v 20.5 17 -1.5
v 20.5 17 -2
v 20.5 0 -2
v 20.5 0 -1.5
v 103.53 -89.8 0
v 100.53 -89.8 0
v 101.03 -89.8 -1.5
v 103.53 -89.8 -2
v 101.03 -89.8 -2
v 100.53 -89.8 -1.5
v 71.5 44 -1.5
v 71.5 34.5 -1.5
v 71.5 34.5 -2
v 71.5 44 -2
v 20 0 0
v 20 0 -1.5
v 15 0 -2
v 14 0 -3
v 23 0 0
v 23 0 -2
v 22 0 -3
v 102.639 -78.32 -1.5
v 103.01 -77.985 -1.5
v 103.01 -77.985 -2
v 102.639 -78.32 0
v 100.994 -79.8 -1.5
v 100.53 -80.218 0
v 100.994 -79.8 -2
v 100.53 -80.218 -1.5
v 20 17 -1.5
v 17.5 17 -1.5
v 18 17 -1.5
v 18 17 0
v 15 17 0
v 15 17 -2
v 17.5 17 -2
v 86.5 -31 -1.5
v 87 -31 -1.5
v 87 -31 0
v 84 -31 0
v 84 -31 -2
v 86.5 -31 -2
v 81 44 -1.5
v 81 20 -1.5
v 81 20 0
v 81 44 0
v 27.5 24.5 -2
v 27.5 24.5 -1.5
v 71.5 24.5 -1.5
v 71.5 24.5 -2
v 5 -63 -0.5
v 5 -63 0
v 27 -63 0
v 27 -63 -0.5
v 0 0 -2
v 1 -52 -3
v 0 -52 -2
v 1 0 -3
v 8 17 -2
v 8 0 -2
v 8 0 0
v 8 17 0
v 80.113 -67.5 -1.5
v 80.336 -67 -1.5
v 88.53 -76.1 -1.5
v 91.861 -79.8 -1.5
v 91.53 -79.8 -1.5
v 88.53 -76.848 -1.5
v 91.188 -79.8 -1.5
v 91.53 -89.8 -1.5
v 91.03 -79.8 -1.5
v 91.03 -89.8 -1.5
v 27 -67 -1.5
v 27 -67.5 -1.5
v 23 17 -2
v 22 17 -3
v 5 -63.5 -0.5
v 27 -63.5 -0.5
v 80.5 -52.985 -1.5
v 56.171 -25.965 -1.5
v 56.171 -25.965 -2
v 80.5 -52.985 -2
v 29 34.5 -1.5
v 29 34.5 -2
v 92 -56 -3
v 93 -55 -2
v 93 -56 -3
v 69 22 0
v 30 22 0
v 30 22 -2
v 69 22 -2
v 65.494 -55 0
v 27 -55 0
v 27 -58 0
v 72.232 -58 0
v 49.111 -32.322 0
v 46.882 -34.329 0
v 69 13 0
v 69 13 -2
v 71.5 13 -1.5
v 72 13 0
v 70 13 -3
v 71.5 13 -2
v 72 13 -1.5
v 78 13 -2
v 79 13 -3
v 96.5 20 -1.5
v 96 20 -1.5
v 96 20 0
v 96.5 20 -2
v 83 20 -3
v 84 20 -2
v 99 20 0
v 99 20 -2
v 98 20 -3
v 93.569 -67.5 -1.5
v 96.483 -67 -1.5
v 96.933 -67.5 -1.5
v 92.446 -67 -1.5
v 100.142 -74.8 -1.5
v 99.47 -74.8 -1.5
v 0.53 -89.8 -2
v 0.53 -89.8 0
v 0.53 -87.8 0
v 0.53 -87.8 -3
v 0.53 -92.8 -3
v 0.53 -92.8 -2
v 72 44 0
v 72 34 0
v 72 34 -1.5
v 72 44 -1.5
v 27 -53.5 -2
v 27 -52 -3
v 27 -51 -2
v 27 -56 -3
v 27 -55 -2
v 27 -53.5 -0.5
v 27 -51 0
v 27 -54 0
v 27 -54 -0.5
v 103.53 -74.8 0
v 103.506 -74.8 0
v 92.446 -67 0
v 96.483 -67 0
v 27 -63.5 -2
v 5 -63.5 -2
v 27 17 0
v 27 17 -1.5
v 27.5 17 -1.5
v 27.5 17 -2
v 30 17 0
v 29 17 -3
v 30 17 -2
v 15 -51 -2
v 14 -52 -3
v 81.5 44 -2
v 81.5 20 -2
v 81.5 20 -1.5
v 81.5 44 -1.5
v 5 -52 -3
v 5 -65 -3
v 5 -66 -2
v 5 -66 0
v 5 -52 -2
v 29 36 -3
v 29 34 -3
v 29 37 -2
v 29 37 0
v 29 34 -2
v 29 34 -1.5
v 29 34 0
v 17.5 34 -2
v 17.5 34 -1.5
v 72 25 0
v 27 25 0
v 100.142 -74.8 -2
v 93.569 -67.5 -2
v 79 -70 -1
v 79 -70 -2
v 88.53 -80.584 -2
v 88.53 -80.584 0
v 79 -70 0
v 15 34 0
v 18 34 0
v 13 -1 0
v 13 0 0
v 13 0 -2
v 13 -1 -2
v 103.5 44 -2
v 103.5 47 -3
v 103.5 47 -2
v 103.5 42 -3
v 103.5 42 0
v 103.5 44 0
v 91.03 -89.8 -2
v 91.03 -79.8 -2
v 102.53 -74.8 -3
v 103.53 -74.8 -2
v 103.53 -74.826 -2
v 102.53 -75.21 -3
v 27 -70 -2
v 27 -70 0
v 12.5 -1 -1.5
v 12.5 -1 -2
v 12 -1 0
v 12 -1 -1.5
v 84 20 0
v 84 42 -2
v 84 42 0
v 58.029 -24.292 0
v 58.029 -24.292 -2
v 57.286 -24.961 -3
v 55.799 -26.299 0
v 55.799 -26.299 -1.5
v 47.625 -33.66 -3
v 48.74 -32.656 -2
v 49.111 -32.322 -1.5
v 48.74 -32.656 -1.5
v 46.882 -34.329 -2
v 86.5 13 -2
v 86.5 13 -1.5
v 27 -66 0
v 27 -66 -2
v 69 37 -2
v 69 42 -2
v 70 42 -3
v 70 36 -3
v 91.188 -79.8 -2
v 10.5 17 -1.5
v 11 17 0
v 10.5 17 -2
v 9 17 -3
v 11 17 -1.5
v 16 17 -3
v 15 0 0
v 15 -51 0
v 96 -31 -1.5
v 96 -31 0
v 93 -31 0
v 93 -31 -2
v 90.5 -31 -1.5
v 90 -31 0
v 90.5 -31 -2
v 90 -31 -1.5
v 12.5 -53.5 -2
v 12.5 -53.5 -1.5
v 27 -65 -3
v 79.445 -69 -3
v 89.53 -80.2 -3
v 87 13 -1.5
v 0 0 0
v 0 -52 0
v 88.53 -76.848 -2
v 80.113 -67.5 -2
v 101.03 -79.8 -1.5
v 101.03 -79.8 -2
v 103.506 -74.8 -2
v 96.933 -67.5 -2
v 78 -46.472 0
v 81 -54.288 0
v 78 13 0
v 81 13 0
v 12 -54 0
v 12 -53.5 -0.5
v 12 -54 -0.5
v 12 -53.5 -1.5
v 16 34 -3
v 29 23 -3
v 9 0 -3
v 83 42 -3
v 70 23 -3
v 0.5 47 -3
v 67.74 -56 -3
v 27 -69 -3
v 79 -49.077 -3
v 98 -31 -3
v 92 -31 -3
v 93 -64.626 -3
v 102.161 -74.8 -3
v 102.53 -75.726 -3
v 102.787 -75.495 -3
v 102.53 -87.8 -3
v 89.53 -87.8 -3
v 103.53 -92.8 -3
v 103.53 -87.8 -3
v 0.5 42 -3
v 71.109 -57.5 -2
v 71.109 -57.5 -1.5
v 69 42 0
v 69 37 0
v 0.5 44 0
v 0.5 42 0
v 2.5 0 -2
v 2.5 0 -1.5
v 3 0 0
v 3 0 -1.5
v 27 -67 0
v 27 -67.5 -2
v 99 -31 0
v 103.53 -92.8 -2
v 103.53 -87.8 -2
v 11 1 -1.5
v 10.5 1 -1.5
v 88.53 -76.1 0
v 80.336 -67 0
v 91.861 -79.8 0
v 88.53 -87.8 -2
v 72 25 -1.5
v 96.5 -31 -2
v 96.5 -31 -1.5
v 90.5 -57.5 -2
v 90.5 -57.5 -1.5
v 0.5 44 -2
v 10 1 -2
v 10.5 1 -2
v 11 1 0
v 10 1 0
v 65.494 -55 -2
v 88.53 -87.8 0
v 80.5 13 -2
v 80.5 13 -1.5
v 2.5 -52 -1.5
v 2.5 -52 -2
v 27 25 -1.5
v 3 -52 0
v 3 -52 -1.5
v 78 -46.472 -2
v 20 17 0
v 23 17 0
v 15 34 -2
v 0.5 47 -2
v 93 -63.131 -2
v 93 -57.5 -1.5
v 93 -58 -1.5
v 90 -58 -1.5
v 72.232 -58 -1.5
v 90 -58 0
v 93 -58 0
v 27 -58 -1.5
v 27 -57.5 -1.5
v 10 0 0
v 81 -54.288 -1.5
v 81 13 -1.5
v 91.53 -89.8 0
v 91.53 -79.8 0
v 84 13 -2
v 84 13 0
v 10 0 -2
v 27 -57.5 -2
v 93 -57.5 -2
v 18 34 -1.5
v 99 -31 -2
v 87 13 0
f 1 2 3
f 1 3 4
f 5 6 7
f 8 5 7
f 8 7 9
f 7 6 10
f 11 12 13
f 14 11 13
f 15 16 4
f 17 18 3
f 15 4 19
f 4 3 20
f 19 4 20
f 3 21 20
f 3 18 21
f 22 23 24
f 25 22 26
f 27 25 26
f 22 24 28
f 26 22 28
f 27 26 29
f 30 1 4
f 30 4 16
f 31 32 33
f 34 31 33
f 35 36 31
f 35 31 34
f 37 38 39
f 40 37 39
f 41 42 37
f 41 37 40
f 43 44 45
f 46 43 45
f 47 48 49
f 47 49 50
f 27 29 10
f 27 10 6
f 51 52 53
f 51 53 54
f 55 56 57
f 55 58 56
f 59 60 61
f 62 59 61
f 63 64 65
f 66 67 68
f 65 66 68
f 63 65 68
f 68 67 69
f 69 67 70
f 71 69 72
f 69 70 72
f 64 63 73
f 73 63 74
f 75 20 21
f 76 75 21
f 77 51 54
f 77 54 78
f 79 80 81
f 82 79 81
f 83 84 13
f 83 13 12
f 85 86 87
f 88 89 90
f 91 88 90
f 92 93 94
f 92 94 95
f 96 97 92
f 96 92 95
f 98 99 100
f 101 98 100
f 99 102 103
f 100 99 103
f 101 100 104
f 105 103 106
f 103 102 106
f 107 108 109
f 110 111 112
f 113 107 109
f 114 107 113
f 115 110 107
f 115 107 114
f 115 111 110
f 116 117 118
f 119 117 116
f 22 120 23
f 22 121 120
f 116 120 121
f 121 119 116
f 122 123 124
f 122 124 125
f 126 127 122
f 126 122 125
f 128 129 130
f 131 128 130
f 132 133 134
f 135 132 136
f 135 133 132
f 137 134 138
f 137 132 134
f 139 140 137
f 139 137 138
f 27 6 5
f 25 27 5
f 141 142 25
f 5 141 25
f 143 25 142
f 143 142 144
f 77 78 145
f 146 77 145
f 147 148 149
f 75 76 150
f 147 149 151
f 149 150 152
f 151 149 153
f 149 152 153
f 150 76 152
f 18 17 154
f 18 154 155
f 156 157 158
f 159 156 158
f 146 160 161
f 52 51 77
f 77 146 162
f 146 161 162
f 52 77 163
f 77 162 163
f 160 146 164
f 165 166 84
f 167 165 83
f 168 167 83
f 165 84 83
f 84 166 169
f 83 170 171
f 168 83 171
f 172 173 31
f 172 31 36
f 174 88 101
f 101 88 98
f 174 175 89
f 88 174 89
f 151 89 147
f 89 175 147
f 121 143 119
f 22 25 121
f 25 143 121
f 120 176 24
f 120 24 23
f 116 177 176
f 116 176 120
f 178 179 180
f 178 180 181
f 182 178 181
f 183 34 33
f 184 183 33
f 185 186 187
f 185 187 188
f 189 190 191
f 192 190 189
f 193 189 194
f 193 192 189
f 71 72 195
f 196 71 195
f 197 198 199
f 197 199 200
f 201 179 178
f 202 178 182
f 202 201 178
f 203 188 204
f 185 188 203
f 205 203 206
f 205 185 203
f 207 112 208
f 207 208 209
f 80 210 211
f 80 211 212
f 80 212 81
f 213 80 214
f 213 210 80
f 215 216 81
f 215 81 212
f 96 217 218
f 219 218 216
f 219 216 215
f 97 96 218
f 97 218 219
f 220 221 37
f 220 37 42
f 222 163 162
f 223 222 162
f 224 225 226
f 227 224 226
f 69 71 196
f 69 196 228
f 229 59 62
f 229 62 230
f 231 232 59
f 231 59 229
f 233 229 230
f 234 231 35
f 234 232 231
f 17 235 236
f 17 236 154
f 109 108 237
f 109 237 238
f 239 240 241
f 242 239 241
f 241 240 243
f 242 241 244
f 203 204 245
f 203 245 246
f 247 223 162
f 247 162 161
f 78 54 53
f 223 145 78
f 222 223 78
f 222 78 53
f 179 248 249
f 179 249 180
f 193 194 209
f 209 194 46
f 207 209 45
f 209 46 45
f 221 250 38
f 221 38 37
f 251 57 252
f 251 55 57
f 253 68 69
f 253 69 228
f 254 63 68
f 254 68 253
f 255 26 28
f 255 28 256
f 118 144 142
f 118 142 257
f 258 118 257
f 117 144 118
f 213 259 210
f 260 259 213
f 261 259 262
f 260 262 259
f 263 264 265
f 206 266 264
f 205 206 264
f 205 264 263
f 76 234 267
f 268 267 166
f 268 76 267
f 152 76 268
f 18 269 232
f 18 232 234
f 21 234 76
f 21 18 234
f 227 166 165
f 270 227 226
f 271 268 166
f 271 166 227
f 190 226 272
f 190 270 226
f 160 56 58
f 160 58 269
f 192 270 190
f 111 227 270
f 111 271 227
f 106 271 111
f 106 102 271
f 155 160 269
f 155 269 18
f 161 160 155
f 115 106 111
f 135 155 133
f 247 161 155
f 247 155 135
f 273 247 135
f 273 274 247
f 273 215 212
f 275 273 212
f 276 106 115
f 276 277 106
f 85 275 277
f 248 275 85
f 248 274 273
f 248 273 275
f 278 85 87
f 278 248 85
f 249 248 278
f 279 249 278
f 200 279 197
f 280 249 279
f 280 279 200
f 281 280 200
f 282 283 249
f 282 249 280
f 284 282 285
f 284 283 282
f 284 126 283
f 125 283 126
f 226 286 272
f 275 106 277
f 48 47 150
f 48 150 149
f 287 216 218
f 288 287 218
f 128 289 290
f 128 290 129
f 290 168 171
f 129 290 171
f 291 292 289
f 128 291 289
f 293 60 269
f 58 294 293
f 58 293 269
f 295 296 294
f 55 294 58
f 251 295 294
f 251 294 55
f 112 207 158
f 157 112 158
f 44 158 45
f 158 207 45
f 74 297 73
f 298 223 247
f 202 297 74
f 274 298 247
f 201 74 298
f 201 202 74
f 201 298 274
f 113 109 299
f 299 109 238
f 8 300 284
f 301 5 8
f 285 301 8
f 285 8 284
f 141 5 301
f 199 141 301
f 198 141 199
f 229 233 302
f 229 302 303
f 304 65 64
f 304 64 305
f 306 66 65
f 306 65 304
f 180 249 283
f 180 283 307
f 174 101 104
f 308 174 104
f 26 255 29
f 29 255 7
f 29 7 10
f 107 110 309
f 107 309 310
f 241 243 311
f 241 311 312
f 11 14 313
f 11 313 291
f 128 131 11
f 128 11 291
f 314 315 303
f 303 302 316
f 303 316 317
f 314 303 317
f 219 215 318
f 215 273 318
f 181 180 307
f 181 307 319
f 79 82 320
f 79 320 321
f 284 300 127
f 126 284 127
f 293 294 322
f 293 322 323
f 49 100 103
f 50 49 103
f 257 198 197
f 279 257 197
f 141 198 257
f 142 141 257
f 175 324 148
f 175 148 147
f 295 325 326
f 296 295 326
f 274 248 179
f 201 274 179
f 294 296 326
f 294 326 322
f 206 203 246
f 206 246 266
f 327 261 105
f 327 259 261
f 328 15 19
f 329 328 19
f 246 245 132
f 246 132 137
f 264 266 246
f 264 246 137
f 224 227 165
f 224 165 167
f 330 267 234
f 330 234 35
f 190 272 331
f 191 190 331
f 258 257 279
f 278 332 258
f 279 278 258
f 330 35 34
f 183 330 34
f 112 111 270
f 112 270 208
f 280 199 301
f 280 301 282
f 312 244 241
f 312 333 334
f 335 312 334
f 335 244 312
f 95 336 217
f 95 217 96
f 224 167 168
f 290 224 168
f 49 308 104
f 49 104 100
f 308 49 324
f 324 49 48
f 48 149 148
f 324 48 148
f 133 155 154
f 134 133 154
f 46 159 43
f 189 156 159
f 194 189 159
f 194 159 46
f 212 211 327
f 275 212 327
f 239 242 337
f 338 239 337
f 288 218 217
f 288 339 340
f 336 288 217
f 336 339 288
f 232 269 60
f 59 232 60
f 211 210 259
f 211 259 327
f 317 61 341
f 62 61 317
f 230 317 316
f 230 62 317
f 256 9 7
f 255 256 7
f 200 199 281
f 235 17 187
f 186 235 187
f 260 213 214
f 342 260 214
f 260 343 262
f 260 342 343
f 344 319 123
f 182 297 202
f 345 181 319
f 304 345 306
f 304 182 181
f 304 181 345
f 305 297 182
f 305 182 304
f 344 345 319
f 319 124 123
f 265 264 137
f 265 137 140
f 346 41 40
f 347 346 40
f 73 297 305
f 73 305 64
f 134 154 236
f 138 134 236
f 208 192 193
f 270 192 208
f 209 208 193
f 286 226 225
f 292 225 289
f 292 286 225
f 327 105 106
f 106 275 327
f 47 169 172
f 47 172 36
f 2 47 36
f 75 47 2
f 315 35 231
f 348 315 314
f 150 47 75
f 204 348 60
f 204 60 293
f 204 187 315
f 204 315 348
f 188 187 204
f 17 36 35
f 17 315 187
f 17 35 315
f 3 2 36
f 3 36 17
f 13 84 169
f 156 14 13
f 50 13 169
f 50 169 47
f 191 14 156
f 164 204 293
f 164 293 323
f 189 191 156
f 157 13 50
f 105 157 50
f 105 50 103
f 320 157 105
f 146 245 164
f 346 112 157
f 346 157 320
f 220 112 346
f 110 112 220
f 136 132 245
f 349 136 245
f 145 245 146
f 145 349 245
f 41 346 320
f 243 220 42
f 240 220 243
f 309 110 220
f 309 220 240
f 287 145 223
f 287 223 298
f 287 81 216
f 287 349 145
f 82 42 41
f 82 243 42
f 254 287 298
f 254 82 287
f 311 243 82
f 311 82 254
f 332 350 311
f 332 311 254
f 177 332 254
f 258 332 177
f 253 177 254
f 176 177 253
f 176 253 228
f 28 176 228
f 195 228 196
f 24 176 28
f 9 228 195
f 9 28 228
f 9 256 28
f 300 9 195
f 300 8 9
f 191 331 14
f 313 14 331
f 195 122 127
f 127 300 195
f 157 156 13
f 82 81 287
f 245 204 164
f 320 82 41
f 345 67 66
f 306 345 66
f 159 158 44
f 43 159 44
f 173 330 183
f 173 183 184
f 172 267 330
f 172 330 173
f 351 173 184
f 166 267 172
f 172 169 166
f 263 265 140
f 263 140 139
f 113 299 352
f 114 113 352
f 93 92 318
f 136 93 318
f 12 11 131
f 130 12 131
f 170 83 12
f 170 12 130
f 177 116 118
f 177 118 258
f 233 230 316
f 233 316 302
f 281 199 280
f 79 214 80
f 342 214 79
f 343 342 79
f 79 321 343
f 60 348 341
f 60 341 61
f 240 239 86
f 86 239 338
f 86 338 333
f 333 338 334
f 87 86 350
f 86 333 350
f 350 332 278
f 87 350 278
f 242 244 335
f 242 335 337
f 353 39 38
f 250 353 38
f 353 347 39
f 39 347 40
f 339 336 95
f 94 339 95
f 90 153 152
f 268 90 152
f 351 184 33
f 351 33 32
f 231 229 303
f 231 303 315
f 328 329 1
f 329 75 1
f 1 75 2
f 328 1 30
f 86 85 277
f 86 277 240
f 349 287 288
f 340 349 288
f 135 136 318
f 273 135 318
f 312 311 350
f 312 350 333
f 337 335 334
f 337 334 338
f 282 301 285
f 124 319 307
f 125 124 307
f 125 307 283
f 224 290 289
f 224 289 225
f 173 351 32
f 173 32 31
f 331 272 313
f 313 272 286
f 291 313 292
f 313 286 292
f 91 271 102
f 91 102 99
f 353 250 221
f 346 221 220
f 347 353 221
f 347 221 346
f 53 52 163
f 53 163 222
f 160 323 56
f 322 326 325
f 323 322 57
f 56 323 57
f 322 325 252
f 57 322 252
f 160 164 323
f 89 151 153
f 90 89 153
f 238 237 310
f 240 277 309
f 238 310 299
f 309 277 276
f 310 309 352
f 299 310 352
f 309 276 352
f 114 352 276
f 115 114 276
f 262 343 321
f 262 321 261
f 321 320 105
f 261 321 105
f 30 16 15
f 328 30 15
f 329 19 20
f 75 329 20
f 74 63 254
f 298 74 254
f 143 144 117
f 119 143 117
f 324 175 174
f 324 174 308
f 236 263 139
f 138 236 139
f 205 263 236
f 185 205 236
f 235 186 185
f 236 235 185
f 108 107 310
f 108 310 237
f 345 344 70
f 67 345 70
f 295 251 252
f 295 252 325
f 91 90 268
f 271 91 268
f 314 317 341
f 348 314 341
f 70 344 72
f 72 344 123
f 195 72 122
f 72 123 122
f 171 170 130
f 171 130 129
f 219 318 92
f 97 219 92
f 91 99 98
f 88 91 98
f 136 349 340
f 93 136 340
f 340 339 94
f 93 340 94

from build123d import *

# Parameters (mm, degrees)
PAD_DEPTH       = 51
PAD001_DEPTH    = 22
PAD002_DEPTH    = 66
PAD003_DEPTH    = 1
PAD004_DEPTH    = 25
PAD005_DEPTH    = 51
PAD006_DEPTH    = 17
PAD007_DEPTH    = 17
PAD008_DEPTH    = 17
PAD009_DEPTH    = 41
SKETCH010_W     = 2
SKETCH010_H     = 1
PAD010_DEPTH    = 7
POCKET_DEPTH    = 1
PAD011_DEPTH    = 68
POCKET001_DEPTH = 68
POCKET002_DEPTH = 70
POCKET003_DEPTH = 22
POCKET004_DEPTH = 54
POCKET005_DEPTH = 17
SKETCH018_W     = 3
SKETCH018_H     = 2
POCKET006_DEPTH = 2
POCKET007_DEPTH = 17
PAD012_DEPTH    = 17
PAD013_DEPTH    = 18
POCKET008_DEPTH = 70
SKETCH023_W     = 3
SKETCH023_H     = 5
PAD014_DEPTH    = 103
POCKET009_DEPTH = 13
SKETCH025_W     = 2
SKETCH025_H     = 3
POCKET010_DEPTH = 103
SKETCH026_W     = 3
SKETCH026_H     = 5
PAD015_DEPTH    = 103
SKETCH027_W     = 2
SKETCH027_H     = 3
POCKET011_DEPTH = 103
POCKET012_DEPTH = 31
POCKET013_DEPTH = 45
POCKET014_DEPTH = 28
PAD016_DEPTH    = 44
POCKET015_DEPTH = 51
SKETCH033_W     = 6
SKETCH033_H     = 7
POCKET016_DEPTH = 2


with BuildPart() as part:
    # Sketch → Pad (new body)
    with BuildSketch(Plane.XZ):
        Polygon((0, 0), (15, 0), (15, -2), (14, -3), (1, -3), (0, -2), align=None)
    extrude(amount=PAD_DEPTH)

    # Sketch001 (on Face2 of Pad) → Pad001 (join)
    with BuildSketch(Plane(origin=(5, 0, 0), x_dir=(0, 0, 1), z_dir=(1, 0, 0))):
        Polygon((0, 51), (0, 66), (-2, 66), (-3, 65), (-3, 52), (-2, 51), align=None)
    extrude(amount=PAD001_DEPTH)

    # Sketch002 (on Face14 of Pad001) → Pad002 (join)
    with BuildSketch(Plane(origin=(27, 0, 0), x_dir=(0, 0, 1), z_dir=(1, 0, 0))):
        Polygon((0, 70), (0, 55), (-2, 55), (-3, 56), (-3, 69), (-2, 70), align=None)
    extrude(amount=PAD002_DEPTH)

    # Sketch004 (on Face5 of Pad002) → Pad003 (join)
    with BuildSketch(Plane.XZ.offset(51)):
        Polygon((0, 0), (15, 0), (15, -2), (14, -3), (1, -3), (0, -2), align=None)
    extrude(amount=PAD003_DEPTH)

    # Sketch003 (on Face20 of Pad002) → Pad004 (join)
    with BuildSketch(Plane(origin=(0, -56, 0), x_dir=(1, 0, 0), z_dir=(0, 1, 0))):
        Polygon((93, 0), (78, 0), (78, 2), (79, 3), (92, 3), (93, 2), align=None)
    extrude(amount=PAD004_DEPTH)

    # Sketch005 (on Face38 of Pad004) → Pad005 (join)
    with BuildSketch(Plane(origin=(0, -31, 0), x_dir=(1, 0, 0), z_dir=(0, 1, 0))):
        Polygon((84, 0), (99, 0), (99, 2), (98, 3), (85, 3), (84, 2), align=None)
    extrude(amount=PAD005_DEPTH)

    # Sketch006 (on Face47 of Pad005) → Pad006 (join)
    with BuildSketch(Plane(origin=(0, 13, 0), x_dir=(1, 0, 0), z_dir=(0, 1, 0))):
        Polygon((69, 0), (84, 0), (84, 2), (83, 3), (70, 3), (69, 2), align=None)
    extrude(amount=PAD006_DEPTH)

    # Sketch007 (on Face4 of Pad006) → Pad007 (join)
    with BuildSketch(Plane(origin=(0, 0, 0), x_dir=(1, 0, 0), z_dir=(0, 1, 0))):
        Polygon((8, 0), (23, 0), (23, 2), (22, 3), (9, 3), (8, 2), align=None)
    extrude(amount=PAD007_DEPTH)

    # Sketch008 (on Face17 of Pad007) → Pad008 (join)
    with BuildSketch(Plane(origin=(0, 17, 0), x_dir=(1, 0, 0), z_dir=(0, 1, 0))):
        Polygon((15, 0), (30, 0), (30, 2), (29, 3), (16, 3), (15, 2), align=None)
    extrude(amount=PAD008_DEPTH)

    # Sketch009 (on Face31 of Pad008) → Pad009 (join)
    with BuildSketch(Plane(origin=(29, 0, 0), x_dir=(0, 0, 1), z_dir=(1, 0, 0))):
        Polygon((0, -37), (0, -22), (-2, -22), (-3, -23), (-3, -36), (-2, -37), align=None)
    extrude(amount=PAD009_DEPTH)

    # Sketch010 (on Face81 of Pad009) → Pad010 (join)
    with BuildSketch(Plane(origin=(0, 13, 0), x_dir=(1, 0, 0), z_dir=(0, 1, 0))):
        with Locations((84, 2.5)):
            Rectangle(SKETCH010_W, SKETCH010_H)
    extrude(amount=PAD010_DEPTH)

    # Sketch011 (on Face36 of Pad010) → Pocket (cut)
    with BuildSketch(Plane(origin=(0, 0, 0), x_dir=(-1, 0, 0), z_dir=(0, 0, 1))):
        Polygon((-90.1471723822, 70), (-79, 70), (-90.1471723822, 59.9630409046), align=None)
    extrude(amount=-POCKET_DEPTH, mode=Mode.SUBTRACT)

    # Sketch012 (on Face51 of Pocket) → Pad011 (join)
    with BuildSketch(Plane(origin=(38.0611229336, -42.2711594585, 0), x_dir=(0.7431448255, 0.6691306064, 0), z_dir=(0.6691306064, -0.7431448255, 0))):
        Polygon((11.8692987676, 0), (26.8692987676, 0), (26.8692987676, -2), (25.8692987676, -3), (12.8692987676, -3), (11.8692987676, -2), align=None)
    extrude(amount=PAD011_DEPTH)

    # Sketch013 (on Face80 of Pad011) → Pocket001 (cut)
    with BuildSketch(Plane(origin=(83.562004166, -92.805007591, 0), x_dir=(0.7431448255, 0.6691306064, 0), z_dir=(0.6691306064, -0.7431448255, 0))):
        Polygon((14.8692987676, 0), (23.8692987676, 0), (23.8692987676, -1.5), (24.3692987676, -1.5), (24.3692987676, -2), (14.3692987676, -2), (14.3692987676, -1.5), (14.8692987676, -1.5), align=None)
    extrude(amount=-POCKET001_DEPTH, mode=Mode.SUBTRACT)

    # Sketch014 (on Face46 of Pocket001) → Pocket002 (cut)
    with BuildSketch(Plane(origin=(27, 0, 0), x_dir=(0, 0, -1), z_dir=(-1, 0, 0))):
        Polygon((0, 67), (1.5, 67), (1.5, 67.5), (2, 67.5), (2, 57.5), (1.5, 57.5), (1.5, 58), (0, 58), align=None)
    extrude(amount=-POCKET002_DEPTH, mode=Mode.SUBTRACT)

    # Sketch015 (on Face34 of Pocket002) → Pocket003 (cut)
    with BuildSketch(Plane(origin=(5, 0, 0), x_dir=(0, 0, -1), z_dir=(-1, 0, 0))):
        Polygon((0, 63), (0.5, 63), (0.5, 63.5), (2, 63.5), (2, 53.5), (0.5, 53.5), (0.5, 54), (0, 54), align=None)
    extrude(amount=-POCKET003_DEPTH, mode=Mode.SUBTRACT)

    # Sketch016 (on Face4 of Pocket003) → Pocket004 (cut)
    with BuildSketch(Plane(origin=(0, 0, 0), x_dir=(1, 0, 0), z_dir=(0, 1, 0))):
        Polygon((2.5, 2), (12.5, 2), (12.5, 1.5), (12, 1.5), (12, 0), (3, 0), (3, 1.5), (2.5, 1.5), align=None)
    extrude(amount=-POCKET004_DEPTH, mode=Mode.SUBTRACT)

    # Sketch017 (on Face19 of Pocket004) → Pocket005 (cut)
    with BuildSketch(Plane(origin=(0, 17, 0), x_dir=(1, 0, 0), z_dir=(0, 1, 0))):
        Polygon((11, 0), (11, 1.5), (10.5, 1.5), (10.5, 2), (20.5, 2), (20.5, 1.5), (20, 1.5), (20, 0), align=None)
    extrude(amount=-POCKET005_DEPTH, mode=Mode.SUBTRACT)

    # Sketch018 (on Face48 of Pocket005) → Pocket006 (cut)
    with BuildSketch(Plane(origin=(0, 0, 0), x_dir=(-1, 0, 0), z_dir=(0, 0, 1))):
        with Locations((-11.5, 0)):
            Rectangle(SKETCH018_W, SKETCH018_H)
    extrude(amount=-POCKET006_DEPTH, mode=Mode.SUBTRACT)

    # Sketch019 (on Face63 of Pocket006) → Pocket007 (cut)
    with BuildSketch(Plane(origin=(0, 34, 0), x_dir=(1, 0, 0), z_dir=(0, 1, 0))):
        Polygon((18, 0), (18, 1.5), (17.5, 1.5), (17.5, 2), (27.5, 2), (27.5, 1.5), (27, 1.5), (27, 0), align=None)
    extrude(amount=-POCKET007_DEPTH, mode=Mode.SUBTRACT)

    # Sketch020 (on Face117 of Pocket007) → Pad012 (join)
    with BuildSketch(Plane(origin=(0, 30, 0), x_dir=(1, 0, 0), z_dir=(0, 1, 0))):
        Polygon((70, 3), (83, 3), (84, 2), (84, 0), (69, 0), (69, 2), align=None)
    extrude(amount=PAD012_DEPTH)

    # Sketch021 (on Face108 of Pad012) → Pad013 (join)
    with BuildSketch(Plane.XZ.offset(74.8)):
        Polygon((88.5297845093, 0), (103.5297845093, 0), (103.5297845093, -2), (102.5297845093, -3), (89.5297845093, -3), (88.5297845093, -2), align=None)
    extrude(amount=PAD013_DEPTH)

    # Sketch022 (on Face158 of Pad013) → Pocket008 (cut)
    with BuildSketch(Plane(origin=(38.0611229336, -42.2711594585, 0), x_dir=(0.7431448255, 0.6691306064, 0), z_dir=(-0.6691306064, 0.7431448255, 0))):
        Polygon((14.3692987676, 2), (24.3692987676, 2), (24.3692987676, 1.5), (23.8692987676, 1.5), (23.8692987676, 0), (14.8692987676, 0), (14.8692987676, 1.5), (14.3692987676, 1.5), align=None)
    extrude(amount=-POCKET008_DEPTH, mode=Mode.SUBTRACT)

    # Sketch023 (on Face171 of Pocket008) → Pad014 (join)
    with BuildSketch(Plane(origin=(103.5297845093, 0, 0), x_dir=(0, 0, -1), z_dir=(-1, 0, 0))):
        with Locations((1.5, 90.3)):
            Rectangle(SKETCH023_W, SKETCH023_H)
    extrude(amount=PAD014_DEPTH)

    # Sketch024 (on Face231 of Pad014) → Pocket009 (cut)
    with BuildSketch(Plane.XZ.offset(92.8)):
        Polygon((91.0297845093, -2), (101.0297845093, -2), (101.0297845093, -1.5), (100.5297845093, -1.5), (100.5297845093, 0), (91.5297845093, 0), (91.5297845093, -1.5), (91.0297845093, -1.5), align=None)
    extrude(amount=-POCKET009_DEPTH, mode=Mode.SUBTRACT)

    # Sketch025 (on Face210 of Pocket009) → Pocket010 (cut)
    with BuildSketch(Plane(origin=(0.5297845093, 0, 0), x_dir=(0, 0, -1), z_dir=(-1, 0, 0))):
        with Locations((1, 91.3)):
            Rectangle(SKETCH025_W, SKETCH025_H)
    extrude(amount=-POCKET010_DEPTH, mode=Mode.SUBTRACT)

    # Sketch026 (on Face150 of Pocket010) → Pad015 (join)
    with BuildSketch(Plane(origin=(0.5, 0, 0), x_dir=(0, 0, 1), z_dir=(1, 0, 0))):
        with Locations((-1.5, -44.5)):
            Rectangle(SKETCH026_W, SKETCH026_H)
    extrude(amount=PAD015_DEPTH)

    # Sketch027 (on Face187 of Pad015) → Pocket011 (cut)
    with BuildSketch(Plane(origin=(103.5, 0, 0), x_dir=(0, 0, 1), z_dir=(1, 0, 0))):
        with Locations((-1, -45.5)):
            Rectangle(SKETCH027_W, SKETCH027_H)
    extrude(amount=-POCKET011_DEPTH, mode=Mode.SUBTRACT)

    # Sketch028 (on Face117 of Pocket011) → Pocket012 (cut)
    with BuildSketch(Plane.XZ.offset(-13)):
        Polygon((71.5, -2), (81.5, -2), (81.5, -1.5), (81, -1.5), (81, 0), (72, 0), (72, -1.5), (71.5, -1.5), align=None)
    extrude(amount=-POCKET012_DEPTH, mode=Mode.SUBTRACT)

    # Sketch029 (on Face87 of Pocket012) → Pocket013 (cut)
    with BuildSketch(Plane(origin=(27, 0, 0), x_dir=(0, 0, -1), z_dir=(-1, 0, 0))):
        Polygon((2, -24.5), (2, -34.5), (1.5, -34.5), (1.5, -34), (0, -34), (0, -25), (1.5, -25), (1.5, -24.5), align=None)
    extrude(amount=-POCKET013_DEPTH, mode=Mode.SUBTRACT)

    # Sketch030 (on Face210 of Pocket013) → Pocket014 (cut)
    with BuildSketch(Plane(origin=(0, -31, 0), x_dir=(1, 0, 0), z_dir=(0, 1, 0))):
        Polygon((80.5, 2), (90.5, 2), (90.5, 1.5), (90, 1.5), (90, 0), (81, 0), (81, 1.5), (80.5, 1.5), align=None)
    extrude(amount=-POCKET014_DEPTH, mode=Mode.SUBTRACT)

    # Sketch031 (on Face234 of Pocket014) → Pad016 (join)
    with BuildSketch(Plane(origin=(0, -31, 0), x_dir=(1, 0, 0), z_dir=(0, 1, 0))):
        Polygon((78, 2), (79, 3), (85, 3), (85, 2), (80.5, 2), (80.5, 1.5), (81, 1.5), (81, 0), (78, 0), align=None)
    extrude(amount=PAD016_DEPTH)

    # Sketch032 (on Face205 of Pad016) → Pocket015 (cut)
    with BuildSketch(Plane(origin=(0, 20, 0), x_dir=(1, 0, 0), z_dir=(0, 1, 0))):
        Polygon((86.5, 2), (96.5, 2), (96.5, 1.5), (96, 1.5), (96, 0), (87, 0), (87, 1.5), (86.5, 1.5), align=None)
    extrude(amount=-POCKET015_DEPTH, mode=Mode.SUBTRACT)

    # Sketch033 (on Face207 of Pocket015) → Pocket016 (cut)
    with BuildSketch(Plane(origin=(0, 0, 0), x_dir=(-1, 0, 0), z_dir=(0, 0, 1))):
        with Locations((-84, -16.5)):
            Rectangle(SKETCH033_W, SKETCH033_H)
    extrude(amount=-POCKET016_DEPTH, mode=Mode.SUBTRACT)


solid = part.part
